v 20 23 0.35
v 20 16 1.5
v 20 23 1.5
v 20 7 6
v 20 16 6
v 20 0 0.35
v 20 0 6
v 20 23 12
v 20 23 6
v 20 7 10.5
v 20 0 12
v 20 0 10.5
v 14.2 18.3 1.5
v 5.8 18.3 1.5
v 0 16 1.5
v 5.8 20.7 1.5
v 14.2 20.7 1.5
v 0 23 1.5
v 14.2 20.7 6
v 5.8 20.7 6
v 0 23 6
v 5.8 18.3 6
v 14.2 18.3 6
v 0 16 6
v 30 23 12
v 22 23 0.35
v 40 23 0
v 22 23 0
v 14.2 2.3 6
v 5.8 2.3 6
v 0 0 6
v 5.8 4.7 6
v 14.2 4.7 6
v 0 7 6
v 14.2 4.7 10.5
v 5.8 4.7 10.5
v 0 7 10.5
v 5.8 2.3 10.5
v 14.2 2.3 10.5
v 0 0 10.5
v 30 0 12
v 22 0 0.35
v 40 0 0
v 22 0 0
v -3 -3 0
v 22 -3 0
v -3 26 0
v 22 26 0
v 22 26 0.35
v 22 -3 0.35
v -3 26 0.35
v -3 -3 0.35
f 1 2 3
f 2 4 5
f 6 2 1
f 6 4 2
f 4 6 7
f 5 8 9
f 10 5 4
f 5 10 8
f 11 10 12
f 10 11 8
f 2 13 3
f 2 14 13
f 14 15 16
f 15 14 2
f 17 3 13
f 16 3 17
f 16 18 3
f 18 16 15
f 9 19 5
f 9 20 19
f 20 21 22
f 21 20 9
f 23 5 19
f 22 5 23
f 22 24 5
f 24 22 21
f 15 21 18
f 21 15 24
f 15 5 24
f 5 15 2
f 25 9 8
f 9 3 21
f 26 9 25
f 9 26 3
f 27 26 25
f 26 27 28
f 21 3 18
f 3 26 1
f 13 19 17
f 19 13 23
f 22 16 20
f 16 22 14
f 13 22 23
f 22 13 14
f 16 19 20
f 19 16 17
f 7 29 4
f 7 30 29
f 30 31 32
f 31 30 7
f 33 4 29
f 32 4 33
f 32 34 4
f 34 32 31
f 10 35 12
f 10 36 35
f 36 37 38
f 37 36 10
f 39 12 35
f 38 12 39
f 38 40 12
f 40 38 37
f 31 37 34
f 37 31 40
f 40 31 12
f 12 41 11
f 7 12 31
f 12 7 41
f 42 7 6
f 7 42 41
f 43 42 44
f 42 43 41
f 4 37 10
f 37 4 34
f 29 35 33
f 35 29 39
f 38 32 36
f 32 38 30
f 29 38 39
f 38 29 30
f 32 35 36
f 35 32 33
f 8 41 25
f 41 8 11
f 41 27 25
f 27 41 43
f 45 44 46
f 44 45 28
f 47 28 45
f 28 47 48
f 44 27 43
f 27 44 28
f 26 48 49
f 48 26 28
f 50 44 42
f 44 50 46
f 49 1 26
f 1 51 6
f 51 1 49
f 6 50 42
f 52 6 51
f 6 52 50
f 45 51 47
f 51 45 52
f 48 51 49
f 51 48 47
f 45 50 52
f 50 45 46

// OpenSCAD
// This work is licensed under a Creative Commons Attribution-ShareAlike 4.0 International License (http://creativecommons.org/licenses/by-sa/4.0/)

ba=10;
bb=10;
bw=23;
bl = ba + bb;
bh=12;

al = 20;
aw = 7;
ah = 4.5;
ail = 8.4; // 8
aiw = 2.4; // 2

az = 1.5;

module a() {
    translate([al/2, aw/2, ah/2])
        difference() {
            cube([al, aw, ah], center = true);
            cube([ail, aiw, ah + 0.1], center = true);
        }
}

module b() {
    translate([0, bw, 0])
        rotate([90, 0, 0])
            linear_extrude(height = bw)
                polygon([ [0, 0], [ba, 0], [bl, bh], [0, bh] ]);
}

translate([0, bw, bh]) rotate([180, 0, 0]) union() {
    translate([0, 0, bh - ah - az]) a();
    translate([0, bw - aw, az]) a();
    translate([al, 0, 0]) b();
}
translate([-3, -3, 0]) cube([al + 5, bw + 6, 0.35]);
